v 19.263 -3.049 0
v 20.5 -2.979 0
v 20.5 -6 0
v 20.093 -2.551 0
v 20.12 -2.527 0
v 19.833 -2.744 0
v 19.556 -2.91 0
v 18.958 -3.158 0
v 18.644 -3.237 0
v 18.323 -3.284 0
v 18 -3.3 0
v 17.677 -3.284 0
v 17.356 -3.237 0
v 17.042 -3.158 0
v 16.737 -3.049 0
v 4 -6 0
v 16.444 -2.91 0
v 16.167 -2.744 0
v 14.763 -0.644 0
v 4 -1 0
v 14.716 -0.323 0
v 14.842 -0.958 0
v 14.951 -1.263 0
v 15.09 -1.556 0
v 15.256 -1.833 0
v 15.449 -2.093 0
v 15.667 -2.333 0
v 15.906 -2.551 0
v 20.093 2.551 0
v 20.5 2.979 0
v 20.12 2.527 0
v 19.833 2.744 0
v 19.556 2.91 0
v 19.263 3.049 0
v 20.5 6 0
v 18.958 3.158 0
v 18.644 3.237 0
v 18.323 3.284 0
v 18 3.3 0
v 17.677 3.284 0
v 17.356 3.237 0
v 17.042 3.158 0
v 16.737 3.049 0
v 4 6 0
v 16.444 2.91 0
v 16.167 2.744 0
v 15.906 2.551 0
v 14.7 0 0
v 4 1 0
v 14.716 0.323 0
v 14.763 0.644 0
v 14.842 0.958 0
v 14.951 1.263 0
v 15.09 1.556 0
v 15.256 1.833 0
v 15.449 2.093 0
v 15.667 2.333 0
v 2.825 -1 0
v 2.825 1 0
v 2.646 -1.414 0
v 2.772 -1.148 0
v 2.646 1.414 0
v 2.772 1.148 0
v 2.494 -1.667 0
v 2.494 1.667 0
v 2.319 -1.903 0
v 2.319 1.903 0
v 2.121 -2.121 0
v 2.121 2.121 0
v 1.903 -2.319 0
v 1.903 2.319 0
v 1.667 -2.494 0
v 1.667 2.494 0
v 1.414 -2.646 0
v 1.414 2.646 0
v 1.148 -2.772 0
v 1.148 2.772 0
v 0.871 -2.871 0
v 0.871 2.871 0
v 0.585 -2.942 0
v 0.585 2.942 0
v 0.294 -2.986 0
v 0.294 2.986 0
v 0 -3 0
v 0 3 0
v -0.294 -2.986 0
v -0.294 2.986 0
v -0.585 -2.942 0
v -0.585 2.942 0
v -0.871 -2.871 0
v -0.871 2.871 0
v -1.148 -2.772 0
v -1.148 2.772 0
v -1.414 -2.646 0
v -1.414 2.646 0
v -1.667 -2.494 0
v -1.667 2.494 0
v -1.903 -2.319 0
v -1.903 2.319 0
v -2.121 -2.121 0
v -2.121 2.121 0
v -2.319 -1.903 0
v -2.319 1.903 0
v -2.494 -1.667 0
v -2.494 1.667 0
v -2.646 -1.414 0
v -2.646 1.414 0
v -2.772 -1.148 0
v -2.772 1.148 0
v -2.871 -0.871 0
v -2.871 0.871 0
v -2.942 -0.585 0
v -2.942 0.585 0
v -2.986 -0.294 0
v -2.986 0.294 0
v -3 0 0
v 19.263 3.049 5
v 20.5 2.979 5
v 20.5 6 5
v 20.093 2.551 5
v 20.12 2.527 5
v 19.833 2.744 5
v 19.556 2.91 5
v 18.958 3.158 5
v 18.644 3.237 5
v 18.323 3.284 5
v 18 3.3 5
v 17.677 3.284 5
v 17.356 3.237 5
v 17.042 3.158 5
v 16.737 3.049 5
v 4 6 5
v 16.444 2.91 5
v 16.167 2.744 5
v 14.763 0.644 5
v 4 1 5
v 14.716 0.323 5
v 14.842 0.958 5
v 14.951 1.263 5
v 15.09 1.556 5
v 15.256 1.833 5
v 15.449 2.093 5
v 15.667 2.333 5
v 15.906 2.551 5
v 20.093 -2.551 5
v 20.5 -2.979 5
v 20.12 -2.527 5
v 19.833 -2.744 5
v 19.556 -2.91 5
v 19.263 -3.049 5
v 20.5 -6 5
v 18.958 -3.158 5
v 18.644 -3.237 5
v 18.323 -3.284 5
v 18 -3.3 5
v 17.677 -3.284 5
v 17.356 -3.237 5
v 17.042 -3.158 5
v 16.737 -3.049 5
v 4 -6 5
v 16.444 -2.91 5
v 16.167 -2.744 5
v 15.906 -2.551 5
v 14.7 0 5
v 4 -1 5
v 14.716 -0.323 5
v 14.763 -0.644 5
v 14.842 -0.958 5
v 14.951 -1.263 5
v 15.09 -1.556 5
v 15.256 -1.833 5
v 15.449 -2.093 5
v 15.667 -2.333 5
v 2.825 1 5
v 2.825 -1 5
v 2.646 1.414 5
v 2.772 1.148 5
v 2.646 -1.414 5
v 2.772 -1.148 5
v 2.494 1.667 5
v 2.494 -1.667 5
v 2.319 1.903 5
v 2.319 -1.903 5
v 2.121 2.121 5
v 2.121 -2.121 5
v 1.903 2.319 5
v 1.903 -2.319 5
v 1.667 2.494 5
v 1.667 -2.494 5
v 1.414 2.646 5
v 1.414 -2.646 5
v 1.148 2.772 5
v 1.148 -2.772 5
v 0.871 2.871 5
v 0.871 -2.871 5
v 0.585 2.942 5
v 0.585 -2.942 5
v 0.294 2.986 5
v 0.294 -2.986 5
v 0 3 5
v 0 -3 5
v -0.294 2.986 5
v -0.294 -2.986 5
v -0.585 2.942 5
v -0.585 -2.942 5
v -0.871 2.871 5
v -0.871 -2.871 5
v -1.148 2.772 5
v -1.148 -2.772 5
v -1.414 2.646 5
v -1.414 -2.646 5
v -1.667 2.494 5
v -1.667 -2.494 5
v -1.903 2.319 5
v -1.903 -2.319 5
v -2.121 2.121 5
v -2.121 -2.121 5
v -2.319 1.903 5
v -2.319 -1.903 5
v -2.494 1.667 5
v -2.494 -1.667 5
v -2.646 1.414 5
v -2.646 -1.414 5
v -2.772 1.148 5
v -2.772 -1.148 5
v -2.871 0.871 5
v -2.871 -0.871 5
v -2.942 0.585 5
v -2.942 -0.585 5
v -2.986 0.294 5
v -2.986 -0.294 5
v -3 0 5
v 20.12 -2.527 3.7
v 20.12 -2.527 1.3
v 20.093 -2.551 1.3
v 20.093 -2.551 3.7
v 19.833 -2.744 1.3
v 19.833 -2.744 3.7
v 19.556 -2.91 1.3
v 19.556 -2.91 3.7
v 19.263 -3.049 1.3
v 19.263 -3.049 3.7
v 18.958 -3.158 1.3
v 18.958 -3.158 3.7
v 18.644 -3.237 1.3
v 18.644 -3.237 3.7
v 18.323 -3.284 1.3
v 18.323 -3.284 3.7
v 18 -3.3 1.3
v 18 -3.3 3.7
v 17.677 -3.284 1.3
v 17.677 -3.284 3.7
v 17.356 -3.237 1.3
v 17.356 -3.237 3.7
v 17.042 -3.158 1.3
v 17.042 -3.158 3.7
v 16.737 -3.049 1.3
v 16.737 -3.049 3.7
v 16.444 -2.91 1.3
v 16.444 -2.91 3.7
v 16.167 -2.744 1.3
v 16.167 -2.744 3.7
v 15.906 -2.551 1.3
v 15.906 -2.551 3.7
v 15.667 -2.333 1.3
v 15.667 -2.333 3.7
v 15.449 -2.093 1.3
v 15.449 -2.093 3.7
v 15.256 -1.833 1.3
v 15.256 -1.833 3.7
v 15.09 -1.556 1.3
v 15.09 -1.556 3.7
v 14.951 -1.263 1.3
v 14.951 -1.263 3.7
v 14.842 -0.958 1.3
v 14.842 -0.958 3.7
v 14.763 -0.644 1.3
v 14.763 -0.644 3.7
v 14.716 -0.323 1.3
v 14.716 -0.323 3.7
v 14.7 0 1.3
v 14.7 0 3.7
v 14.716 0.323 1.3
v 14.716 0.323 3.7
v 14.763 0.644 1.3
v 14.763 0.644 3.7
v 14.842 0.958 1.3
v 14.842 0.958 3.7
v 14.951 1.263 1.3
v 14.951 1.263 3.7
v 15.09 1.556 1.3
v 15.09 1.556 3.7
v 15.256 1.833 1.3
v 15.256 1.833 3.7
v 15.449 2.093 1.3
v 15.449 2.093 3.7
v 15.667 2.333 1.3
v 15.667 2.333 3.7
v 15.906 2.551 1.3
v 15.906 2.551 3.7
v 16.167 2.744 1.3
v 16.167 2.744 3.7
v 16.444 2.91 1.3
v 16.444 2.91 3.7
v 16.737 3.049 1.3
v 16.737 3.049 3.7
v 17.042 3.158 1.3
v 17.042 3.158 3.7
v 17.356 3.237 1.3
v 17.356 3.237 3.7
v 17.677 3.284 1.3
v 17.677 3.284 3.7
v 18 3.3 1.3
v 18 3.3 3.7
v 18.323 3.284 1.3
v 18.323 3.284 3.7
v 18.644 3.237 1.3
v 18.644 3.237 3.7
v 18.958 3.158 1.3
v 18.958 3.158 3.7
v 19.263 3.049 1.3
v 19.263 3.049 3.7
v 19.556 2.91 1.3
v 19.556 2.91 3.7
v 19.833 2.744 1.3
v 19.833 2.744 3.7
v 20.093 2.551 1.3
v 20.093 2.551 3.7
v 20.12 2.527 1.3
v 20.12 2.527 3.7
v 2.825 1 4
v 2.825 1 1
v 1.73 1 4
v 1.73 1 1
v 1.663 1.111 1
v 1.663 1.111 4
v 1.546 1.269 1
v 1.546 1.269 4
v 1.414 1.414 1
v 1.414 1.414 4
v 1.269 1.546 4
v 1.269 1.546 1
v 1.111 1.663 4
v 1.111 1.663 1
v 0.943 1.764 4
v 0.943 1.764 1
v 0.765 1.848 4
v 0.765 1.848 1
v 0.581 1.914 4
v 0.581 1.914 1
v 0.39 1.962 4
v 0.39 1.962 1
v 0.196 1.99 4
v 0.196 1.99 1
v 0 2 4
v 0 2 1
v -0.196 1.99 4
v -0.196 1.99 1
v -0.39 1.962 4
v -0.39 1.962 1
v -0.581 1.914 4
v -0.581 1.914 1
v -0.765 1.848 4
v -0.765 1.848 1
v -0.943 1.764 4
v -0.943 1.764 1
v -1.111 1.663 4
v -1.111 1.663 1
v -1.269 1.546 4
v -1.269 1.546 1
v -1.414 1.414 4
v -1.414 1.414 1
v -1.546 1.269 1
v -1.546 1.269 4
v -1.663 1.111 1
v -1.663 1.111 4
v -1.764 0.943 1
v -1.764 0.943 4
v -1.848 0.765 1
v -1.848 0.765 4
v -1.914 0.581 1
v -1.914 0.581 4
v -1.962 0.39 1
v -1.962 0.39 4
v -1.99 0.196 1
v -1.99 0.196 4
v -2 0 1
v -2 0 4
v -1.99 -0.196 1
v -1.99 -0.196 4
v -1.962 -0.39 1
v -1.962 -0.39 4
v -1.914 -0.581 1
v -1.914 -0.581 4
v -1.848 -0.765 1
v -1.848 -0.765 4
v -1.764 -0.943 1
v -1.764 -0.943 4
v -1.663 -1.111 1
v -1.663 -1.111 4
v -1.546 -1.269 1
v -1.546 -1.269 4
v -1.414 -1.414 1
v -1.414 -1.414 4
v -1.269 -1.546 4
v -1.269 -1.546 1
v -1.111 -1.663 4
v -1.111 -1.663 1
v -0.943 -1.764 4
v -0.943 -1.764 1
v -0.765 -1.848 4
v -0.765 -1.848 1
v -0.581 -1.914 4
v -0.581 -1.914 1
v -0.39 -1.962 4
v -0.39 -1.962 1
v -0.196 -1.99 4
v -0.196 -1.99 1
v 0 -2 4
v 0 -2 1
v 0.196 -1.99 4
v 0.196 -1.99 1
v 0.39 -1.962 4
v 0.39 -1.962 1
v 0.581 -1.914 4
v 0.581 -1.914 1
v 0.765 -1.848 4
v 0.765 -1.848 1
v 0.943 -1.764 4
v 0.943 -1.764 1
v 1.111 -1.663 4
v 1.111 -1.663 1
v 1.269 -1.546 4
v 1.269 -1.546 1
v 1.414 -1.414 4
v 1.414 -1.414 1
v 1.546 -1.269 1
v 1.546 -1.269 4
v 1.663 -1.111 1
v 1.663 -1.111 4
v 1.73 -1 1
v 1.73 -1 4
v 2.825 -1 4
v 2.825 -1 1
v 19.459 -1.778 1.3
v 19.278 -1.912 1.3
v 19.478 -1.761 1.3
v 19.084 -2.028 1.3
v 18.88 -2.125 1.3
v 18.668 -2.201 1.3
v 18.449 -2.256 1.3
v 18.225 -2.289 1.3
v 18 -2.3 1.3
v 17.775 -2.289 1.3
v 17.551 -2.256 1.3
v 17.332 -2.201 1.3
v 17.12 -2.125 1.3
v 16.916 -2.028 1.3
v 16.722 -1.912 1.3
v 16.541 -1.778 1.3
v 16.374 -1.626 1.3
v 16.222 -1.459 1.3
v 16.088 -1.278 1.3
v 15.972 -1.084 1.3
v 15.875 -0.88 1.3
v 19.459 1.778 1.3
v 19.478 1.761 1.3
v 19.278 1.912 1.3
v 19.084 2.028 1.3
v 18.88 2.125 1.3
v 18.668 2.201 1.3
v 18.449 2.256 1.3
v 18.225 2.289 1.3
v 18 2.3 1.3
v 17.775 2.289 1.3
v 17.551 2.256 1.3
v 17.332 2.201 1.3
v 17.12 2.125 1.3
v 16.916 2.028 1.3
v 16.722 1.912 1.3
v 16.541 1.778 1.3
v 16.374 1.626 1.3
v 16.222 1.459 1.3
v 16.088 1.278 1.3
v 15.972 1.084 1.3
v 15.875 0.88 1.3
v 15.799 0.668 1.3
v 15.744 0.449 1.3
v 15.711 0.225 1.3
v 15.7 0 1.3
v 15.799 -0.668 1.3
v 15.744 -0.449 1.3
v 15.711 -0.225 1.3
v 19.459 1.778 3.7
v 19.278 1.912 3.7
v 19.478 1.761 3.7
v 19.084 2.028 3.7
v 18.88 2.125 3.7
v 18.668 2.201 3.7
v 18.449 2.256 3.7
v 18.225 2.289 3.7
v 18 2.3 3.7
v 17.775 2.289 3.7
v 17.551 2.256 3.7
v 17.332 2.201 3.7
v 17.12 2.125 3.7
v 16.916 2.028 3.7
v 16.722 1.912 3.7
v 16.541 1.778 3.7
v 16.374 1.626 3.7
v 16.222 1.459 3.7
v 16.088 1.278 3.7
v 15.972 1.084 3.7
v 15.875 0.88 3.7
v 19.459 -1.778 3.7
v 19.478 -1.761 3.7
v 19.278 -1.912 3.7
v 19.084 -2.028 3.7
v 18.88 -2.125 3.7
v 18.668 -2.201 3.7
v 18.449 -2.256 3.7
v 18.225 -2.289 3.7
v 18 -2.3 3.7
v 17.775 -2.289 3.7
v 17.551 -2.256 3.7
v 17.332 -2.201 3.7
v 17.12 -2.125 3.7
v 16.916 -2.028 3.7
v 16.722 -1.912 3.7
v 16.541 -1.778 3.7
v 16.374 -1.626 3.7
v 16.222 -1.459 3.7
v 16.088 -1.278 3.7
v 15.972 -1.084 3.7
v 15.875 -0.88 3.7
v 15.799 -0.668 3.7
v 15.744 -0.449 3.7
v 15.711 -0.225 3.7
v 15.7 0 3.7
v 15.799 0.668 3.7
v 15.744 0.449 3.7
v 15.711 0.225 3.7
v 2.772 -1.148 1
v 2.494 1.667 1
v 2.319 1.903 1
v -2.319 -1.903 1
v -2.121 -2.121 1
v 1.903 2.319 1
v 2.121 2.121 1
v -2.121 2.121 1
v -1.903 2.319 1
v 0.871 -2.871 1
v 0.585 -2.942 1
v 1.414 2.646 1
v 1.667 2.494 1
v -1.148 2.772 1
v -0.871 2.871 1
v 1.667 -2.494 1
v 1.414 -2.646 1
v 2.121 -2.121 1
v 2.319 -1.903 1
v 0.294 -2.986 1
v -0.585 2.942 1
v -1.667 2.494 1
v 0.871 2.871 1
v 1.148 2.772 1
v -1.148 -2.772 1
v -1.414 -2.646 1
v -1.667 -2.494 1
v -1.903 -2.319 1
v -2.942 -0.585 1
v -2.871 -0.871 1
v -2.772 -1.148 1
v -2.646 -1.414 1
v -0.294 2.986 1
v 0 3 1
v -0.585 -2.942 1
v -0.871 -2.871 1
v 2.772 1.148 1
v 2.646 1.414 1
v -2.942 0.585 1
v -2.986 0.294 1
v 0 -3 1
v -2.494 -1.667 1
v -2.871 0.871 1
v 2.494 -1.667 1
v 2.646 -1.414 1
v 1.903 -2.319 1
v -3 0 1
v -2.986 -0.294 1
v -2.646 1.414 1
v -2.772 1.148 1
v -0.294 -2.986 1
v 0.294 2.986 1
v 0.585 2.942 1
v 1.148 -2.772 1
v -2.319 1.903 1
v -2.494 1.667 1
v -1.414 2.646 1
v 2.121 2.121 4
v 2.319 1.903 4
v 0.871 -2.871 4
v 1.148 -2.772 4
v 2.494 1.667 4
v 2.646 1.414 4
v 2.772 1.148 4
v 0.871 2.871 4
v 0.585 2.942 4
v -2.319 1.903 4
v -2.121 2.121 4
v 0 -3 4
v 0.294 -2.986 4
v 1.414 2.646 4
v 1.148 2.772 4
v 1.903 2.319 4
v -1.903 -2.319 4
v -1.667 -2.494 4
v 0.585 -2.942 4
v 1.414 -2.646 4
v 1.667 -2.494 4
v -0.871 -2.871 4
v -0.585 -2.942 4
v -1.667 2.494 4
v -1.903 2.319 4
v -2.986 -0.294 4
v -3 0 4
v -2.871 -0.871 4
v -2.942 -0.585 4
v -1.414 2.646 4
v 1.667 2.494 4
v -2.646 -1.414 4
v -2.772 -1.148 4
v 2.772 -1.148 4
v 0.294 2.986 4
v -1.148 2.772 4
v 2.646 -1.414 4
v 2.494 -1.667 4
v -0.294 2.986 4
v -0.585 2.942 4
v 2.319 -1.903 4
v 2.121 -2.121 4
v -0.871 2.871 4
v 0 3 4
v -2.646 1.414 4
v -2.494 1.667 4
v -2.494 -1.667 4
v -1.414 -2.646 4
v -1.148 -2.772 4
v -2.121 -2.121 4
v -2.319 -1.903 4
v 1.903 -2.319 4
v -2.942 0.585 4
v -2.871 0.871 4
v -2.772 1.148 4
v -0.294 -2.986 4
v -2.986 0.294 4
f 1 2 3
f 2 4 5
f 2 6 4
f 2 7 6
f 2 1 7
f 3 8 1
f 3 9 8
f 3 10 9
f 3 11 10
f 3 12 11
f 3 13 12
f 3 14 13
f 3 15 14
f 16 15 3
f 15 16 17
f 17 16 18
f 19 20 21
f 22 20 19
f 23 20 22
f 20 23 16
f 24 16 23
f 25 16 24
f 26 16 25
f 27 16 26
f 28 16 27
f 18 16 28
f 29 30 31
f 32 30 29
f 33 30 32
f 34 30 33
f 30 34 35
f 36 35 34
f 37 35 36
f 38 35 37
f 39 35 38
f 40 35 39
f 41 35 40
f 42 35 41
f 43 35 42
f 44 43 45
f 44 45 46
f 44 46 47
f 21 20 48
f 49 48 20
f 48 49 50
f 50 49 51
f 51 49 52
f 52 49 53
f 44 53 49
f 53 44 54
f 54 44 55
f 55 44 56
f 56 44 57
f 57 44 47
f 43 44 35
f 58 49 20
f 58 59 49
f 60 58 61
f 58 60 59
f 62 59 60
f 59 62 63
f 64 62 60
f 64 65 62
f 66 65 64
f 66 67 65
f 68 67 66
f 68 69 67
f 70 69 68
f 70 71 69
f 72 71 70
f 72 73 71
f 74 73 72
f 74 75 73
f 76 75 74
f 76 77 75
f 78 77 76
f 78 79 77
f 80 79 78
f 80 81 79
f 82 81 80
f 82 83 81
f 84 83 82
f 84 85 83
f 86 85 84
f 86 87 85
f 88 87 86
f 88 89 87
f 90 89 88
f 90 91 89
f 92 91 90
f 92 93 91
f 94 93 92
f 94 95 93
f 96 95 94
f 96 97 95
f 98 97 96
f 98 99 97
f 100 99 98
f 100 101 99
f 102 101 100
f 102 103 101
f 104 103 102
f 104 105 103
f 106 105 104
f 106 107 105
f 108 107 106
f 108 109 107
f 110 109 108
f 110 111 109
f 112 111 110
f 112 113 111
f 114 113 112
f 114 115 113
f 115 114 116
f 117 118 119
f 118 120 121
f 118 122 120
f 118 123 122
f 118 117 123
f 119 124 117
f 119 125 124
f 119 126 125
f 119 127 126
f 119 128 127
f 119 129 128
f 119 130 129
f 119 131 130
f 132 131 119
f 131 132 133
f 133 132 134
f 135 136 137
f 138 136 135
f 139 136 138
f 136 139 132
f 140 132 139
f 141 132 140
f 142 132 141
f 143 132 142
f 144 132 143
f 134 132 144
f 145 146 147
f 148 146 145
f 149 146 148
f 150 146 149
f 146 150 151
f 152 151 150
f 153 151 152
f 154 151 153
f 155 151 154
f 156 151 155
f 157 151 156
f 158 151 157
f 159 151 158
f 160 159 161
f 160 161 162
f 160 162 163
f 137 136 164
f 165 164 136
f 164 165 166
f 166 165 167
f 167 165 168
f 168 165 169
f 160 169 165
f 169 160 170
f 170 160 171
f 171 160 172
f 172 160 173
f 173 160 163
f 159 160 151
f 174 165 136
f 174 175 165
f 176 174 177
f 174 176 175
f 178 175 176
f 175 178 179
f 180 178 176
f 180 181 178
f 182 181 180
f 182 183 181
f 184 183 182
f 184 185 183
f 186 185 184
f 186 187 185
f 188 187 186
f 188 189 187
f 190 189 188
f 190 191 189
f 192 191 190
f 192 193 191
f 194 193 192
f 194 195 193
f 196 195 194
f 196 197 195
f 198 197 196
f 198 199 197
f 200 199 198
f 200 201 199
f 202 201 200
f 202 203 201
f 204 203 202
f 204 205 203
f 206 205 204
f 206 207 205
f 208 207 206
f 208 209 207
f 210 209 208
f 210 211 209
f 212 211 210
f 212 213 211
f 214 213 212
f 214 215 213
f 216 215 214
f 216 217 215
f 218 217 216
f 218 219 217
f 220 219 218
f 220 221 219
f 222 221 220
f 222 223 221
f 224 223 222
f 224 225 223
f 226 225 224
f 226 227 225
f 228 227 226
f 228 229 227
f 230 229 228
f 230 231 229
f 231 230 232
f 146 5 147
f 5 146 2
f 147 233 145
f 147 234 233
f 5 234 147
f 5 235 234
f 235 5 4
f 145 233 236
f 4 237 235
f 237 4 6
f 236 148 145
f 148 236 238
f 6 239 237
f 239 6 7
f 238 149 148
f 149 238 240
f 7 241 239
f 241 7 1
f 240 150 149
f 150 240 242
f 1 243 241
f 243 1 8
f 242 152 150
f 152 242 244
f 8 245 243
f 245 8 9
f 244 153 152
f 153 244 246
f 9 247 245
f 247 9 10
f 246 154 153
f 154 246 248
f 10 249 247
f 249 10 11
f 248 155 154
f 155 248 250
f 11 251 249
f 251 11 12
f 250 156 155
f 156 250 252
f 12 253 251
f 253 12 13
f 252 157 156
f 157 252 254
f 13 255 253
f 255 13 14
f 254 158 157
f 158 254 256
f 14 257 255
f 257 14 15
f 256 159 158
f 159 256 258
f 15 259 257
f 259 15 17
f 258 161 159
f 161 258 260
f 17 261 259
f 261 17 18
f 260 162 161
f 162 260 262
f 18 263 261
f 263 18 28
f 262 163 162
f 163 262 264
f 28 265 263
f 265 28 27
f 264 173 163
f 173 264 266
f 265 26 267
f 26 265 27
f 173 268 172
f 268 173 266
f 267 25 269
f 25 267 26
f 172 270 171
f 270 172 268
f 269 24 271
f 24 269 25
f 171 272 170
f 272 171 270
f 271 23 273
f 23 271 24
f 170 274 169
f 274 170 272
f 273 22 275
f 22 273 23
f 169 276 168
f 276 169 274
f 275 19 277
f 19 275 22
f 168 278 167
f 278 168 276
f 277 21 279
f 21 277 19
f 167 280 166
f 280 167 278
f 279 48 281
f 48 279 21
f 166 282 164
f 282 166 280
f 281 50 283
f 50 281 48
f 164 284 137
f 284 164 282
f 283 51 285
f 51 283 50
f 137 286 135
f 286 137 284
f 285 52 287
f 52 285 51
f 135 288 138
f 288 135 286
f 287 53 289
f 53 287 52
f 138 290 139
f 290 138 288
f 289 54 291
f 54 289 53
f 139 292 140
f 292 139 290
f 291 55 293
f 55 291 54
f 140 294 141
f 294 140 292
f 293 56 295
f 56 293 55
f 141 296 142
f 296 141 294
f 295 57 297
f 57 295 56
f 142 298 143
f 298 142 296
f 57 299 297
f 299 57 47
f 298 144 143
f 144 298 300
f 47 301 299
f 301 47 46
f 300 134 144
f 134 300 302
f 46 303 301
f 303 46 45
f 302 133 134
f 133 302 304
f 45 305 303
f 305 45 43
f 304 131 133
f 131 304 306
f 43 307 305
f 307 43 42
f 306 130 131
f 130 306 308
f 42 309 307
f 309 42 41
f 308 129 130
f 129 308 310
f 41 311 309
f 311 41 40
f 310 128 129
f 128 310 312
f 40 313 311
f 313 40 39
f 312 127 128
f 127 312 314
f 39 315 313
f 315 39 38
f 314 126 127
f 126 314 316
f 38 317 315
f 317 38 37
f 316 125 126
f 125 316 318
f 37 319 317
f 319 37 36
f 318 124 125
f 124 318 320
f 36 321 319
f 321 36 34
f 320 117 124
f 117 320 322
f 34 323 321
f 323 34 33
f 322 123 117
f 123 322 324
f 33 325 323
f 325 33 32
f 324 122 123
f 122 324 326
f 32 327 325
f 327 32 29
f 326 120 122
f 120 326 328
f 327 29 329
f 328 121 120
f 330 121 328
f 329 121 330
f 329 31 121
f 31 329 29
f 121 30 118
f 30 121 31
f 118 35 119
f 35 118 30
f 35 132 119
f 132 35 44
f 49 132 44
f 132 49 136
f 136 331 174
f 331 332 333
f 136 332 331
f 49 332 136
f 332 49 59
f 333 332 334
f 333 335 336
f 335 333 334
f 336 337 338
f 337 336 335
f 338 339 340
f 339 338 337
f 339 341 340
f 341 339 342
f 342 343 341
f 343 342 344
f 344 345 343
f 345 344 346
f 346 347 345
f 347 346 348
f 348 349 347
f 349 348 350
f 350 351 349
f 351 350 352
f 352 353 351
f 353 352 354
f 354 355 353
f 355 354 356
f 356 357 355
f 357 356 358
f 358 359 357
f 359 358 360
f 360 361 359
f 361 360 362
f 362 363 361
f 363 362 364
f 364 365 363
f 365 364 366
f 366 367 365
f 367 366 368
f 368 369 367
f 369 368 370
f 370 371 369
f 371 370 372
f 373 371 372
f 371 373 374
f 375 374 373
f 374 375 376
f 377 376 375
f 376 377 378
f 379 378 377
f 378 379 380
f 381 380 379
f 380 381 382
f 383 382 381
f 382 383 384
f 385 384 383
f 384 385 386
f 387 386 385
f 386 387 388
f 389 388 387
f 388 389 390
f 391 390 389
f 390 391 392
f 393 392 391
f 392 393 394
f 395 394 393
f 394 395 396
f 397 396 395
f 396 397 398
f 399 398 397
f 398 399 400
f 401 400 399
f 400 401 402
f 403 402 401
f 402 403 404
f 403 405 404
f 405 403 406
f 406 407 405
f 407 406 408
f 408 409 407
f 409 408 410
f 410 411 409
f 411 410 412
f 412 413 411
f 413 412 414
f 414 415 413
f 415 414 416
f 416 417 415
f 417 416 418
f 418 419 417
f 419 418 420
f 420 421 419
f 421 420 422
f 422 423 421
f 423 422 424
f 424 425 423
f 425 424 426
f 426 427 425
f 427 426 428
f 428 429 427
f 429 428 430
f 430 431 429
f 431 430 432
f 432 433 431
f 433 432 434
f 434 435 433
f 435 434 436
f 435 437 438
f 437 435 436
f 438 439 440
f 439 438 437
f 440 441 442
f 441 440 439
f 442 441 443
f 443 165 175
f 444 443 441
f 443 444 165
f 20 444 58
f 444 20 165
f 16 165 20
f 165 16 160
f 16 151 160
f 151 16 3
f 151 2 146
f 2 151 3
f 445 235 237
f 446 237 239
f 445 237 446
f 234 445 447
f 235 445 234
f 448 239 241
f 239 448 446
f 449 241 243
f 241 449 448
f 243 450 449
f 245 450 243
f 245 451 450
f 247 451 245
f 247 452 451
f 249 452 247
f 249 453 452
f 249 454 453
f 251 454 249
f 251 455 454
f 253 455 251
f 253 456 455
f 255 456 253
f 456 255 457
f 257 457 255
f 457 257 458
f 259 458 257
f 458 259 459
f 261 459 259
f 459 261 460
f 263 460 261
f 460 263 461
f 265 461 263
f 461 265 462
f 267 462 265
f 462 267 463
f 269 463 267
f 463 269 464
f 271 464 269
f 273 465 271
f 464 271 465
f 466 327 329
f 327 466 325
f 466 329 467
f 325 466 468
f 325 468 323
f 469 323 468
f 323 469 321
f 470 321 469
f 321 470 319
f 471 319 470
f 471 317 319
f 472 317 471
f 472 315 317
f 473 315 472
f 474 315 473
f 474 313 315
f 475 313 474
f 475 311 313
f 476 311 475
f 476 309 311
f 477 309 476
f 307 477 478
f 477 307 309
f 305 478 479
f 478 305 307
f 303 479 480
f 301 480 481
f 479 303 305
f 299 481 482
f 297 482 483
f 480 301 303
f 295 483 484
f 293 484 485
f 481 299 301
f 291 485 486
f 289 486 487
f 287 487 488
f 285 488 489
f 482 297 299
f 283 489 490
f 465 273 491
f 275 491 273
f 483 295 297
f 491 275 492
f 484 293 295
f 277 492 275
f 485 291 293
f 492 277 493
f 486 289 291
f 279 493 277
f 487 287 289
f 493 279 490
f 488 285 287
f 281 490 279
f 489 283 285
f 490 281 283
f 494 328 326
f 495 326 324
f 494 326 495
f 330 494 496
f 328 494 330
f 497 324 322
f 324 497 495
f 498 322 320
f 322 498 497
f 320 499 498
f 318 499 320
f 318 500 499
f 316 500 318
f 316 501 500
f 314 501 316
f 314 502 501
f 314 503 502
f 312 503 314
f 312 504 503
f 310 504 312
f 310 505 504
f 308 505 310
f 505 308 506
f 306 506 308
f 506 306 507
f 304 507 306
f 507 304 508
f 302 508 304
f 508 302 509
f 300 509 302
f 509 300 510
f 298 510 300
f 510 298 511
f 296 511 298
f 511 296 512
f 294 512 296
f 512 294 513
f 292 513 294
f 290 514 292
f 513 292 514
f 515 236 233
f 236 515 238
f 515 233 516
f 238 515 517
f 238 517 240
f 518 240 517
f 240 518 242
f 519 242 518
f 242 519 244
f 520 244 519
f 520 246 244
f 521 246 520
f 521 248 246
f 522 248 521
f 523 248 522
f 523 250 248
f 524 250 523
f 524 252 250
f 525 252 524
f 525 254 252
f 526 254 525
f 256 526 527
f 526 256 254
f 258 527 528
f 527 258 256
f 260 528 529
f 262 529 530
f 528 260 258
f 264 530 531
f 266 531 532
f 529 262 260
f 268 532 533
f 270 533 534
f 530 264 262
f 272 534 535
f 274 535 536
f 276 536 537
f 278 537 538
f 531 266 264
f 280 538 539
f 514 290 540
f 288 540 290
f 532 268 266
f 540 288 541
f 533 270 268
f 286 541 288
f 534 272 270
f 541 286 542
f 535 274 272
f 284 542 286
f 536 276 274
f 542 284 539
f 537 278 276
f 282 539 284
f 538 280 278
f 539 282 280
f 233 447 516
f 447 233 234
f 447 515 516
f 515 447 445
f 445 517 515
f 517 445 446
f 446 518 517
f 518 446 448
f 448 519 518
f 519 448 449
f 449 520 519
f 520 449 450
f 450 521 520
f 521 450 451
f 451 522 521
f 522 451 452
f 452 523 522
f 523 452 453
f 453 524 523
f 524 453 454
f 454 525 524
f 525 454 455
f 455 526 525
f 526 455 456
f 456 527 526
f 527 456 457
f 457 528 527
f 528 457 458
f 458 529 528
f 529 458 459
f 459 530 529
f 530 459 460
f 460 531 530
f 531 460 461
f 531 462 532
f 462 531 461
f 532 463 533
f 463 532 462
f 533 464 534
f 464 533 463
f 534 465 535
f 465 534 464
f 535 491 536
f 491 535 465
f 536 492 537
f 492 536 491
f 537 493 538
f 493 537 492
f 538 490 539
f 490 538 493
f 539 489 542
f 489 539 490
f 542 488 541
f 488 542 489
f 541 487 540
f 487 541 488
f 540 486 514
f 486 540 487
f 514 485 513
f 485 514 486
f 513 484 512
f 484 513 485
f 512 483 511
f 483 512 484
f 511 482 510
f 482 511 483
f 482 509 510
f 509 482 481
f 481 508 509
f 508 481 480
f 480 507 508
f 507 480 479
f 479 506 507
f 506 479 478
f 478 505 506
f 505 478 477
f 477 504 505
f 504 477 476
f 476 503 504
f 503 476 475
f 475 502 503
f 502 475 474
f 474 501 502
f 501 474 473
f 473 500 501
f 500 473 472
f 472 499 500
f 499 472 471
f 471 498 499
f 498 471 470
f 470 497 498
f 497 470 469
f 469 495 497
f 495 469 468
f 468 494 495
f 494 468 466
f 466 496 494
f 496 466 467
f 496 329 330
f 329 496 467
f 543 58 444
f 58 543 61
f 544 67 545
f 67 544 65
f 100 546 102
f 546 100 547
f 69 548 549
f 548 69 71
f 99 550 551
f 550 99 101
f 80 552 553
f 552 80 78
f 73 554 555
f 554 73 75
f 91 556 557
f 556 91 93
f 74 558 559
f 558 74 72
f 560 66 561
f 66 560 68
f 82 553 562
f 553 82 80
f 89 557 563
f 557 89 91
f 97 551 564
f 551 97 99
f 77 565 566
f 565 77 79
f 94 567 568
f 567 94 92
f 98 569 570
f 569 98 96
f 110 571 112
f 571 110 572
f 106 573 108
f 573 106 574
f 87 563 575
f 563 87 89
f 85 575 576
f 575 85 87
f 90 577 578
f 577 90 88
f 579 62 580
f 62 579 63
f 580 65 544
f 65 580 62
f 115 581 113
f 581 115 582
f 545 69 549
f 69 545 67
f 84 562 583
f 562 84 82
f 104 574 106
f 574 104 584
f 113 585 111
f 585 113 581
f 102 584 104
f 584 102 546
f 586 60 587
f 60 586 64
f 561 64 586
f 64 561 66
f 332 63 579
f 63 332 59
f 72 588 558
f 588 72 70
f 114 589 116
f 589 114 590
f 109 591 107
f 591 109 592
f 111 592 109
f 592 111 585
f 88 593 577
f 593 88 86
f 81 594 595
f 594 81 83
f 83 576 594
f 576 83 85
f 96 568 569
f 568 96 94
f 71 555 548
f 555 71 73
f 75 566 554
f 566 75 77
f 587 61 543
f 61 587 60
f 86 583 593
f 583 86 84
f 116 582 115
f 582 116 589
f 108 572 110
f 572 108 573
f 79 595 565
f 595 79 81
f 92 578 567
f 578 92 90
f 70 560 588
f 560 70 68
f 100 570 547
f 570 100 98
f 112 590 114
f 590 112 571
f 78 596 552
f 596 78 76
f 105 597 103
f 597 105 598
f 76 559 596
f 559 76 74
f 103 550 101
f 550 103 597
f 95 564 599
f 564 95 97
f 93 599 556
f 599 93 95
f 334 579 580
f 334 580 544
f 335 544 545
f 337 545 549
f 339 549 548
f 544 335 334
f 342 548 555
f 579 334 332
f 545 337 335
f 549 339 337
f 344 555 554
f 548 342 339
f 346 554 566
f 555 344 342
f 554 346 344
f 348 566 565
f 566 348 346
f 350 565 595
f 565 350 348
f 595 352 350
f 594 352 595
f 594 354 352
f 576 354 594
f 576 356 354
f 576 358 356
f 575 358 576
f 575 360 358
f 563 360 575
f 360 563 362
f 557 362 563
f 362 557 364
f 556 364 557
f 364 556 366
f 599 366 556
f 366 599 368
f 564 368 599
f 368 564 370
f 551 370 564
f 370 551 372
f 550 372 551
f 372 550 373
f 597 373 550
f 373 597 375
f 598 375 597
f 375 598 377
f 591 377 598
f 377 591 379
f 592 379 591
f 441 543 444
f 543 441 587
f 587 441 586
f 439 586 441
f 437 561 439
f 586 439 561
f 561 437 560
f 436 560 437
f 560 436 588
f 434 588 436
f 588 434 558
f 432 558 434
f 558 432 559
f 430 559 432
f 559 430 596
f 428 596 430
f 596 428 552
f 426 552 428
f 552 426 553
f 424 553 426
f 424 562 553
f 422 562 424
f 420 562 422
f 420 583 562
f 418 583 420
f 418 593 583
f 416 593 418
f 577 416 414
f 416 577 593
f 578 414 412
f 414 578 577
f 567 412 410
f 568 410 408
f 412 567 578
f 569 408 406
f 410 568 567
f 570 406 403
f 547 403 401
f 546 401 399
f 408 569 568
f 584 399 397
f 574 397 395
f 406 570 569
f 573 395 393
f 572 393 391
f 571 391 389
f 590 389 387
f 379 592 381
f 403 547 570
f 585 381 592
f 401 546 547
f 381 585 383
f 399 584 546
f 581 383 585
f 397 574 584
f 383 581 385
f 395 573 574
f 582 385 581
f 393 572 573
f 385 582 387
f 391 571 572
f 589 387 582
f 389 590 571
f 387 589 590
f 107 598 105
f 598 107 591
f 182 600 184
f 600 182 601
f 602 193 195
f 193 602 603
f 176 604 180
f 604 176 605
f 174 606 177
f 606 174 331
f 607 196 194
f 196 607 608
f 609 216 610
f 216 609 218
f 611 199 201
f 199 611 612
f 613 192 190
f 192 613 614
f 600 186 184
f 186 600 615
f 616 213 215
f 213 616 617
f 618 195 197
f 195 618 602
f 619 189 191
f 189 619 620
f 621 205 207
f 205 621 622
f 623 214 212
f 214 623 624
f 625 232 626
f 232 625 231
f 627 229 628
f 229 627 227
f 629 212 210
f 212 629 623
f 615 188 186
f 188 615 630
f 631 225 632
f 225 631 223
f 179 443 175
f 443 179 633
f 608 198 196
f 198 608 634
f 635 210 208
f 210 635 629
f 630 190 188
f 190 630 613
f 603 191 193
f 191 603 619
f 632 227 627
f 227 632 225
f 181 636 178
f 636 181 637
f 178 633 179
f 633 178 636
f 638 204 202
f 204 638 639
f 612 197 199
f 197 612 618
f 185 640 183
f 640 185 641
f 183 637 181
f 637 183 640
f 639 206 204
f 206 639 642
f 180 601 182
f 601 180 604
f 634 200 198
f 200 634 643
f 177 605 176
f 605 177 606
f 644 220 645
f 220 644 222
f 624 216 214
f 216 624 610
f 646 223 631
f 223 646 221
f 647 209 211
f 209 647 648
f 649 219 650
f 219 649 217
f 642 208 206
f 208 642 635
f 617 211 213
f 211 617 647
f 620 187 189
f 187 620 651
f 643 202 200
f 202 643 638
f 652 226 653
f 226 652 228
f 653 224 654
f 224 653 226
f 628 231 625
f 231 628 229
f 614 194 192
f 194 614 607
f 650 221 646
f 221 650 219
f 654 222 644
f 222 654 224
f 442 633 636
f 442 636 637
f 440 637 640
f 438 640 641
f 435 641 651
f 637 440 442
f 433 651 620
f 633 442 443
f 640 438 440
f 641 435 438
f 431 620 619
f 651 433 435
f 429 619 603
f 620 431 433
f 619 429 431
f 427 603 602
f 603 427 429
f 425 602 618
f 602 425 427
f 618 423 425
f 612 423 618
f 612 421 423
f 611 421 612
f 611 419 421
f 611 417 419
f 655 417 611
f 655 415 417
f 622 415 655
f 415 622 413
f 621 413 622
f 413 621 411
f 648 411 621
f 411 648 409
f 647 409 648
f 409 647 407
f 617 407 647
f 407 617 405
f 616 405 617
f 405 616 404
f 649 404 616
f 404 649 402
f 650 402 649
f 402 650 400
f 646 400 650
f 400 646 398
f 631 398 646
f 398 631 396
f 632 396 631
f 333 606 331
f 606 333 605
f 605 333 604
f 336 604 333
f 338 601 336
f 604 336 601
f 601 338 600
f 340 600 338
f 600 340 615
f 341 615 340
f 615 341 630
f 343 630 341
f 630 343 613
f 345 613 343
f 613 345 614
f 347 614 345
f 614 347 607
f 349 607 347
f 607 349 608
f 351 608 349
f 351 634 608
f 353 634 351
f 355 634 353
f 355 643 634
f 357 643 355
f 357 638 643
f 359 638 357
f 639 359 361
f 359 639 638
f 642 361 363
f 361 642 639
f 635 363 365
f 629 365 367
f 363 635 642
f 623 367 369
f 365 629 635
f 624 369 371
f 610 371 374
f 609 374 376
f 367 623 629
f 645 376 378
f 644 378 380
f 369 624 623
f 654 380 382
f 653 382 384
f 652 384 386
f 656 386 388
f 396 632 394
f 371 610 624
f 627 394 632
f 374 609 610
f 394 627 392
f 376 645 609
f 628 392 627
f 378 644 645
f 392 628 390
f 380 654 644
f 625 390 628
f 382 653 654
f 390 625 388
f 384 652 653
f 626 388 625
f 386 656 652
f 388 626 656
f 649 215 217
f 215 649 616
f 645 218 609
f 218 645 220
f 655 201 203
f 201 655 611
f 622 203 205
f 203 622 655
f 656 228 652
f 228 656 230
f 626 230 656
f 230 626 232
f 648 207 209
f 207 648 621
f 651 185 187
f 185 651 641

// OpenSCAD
part = "link"; // [link, assembly]
cadverify_only = "";
module instance(name, part, unit = 1) {
    echo(cadverify_instance = [name, part, unit]);
    if (cadverify_only == "" || cadverify_only == name) children();
}

// Parameters (mm)
pitch = 18;          // pin-to-bore distance
link_w = 12;         // width (Y)
link_t = 5;          // thickness (Z)
pin_d = 4;           // pin shaft diameter
bore_d = 4.6;        // bore diameter (0.3 radial clearance)
cap_d = 6;           // cap diameter
cap_h = 1;           // cap thickness
gap_z = 0.3;         // vertical clearance cap<->knuckle
kn_h = 2.4;          // knuckle height = 5-2*1-2*0.3
kn_out_d = 7.6;      // knuckle outer diameter (1.5 wall)
cap_cav_d = 6.6;     // cap cavity diameter (0.3 radial clearance)
neck_w = 2;          // neck width
slot_half = 50;      // slot half-angle (deg), allows +-30 deg swing
yoke_east = 20.5;    // full-height yoke east extent (local X)
$fn = 64;

module link_geom() {
    bore_x = pitch;
    cap_r = cap_d/2;
    cav_r = cap_cav_d/2;
    pin_r = pin_d/2;
    bore_r = bore_d/2;
    kn_out_r = kn_out_d/2;
    // far points for slot wedge (full height + middle)
    // wedge from bore center to the east, half-angle slot_half
    wedge_far = 30;
    dy_far = wedge_far * tan(slot_half);
    // ---- full height (0..5): yoke + neck + pin shaft ----
    linear_extrude(height = link_t, convexity = 8) {
        difference() {
            union() {
                // pin shaft disc
                translate([0,0]) circle(r = pin_r);
                // neck rect X[0,5] Y[-1,1]
                translate([0,-neck_w/2]) square([5, neck_w]);
                // yoke base rect X[4,yoke_east] Y[-6,6]
                translate([4,-link_w/2]) square([yoke_east-4, link_w]);
            }
            // cap cavity (for next link caps)
            translate([bore_x,0]) circle(r = cav_r);
            // slot wedge for next-link neck swing (full height)
            polygon(points = [[bore_x,0],[bore_x+wedge_far, dy_far],[bore_x+wedge_far, -dy_far]]);
        }
    }
    // ---- middle knuckle ring (1.3..3.7) ----
    kn_bot = cap_h + gap_z; // 1.3
    translate([0,0,kn_bot])
    linear_extrude(height = kn_h, convexity = 8) {
        difference() {
            translate([bore_x,0]) circle(r = kn_out_r);
            translate([bore_x,0]) circle(r = bore_r);
            polygon(points = [[bore_x,0],[bore_x+wedge_far, dy_far],[bore_x+wedge_far, -dy_far]]);
        }
    }
    // ---- caps ----
    translate([0,0,0]) cylinder(h = cap_h, r = cap_r);
    translate([0,0,link_t-cap_h]) cylinder(h = cap_h, r = cap_r);
}

if (part == "assembly") {
    instance("link1", "link", 1) translate([0,0,0]) link_geom();
    instance("link2", "link", 1) translate([18,0,0]) link_geom();
    instance("link3", "link", 1) translate([36,0,0]) link_geom();
    echo(cadverify_spec = [
        ["bounds", [[-3, -6, 0], [56.5, 6, 5]]],
        ["support_faces", [["bed", "-z", 200]]],
        ["motions", [
            ["bend", ["link3"], "rotate", [36, 0, 0], [0, 0, 1], [-30, 30]]
        ]],
        ["assembly_order", [
            [["link1", "link2", "link3"], [0, 0, 0]]
        ]],
        ["print_in_place", 0.3],
        ["overhangs_allowed", [
            ["pin cap link1", [[-3, -3, 3.8], [3, 3, 4.2]]],
            ["knuckle joint1", [[14.5, -3.5, 1.0], [21, 3.5, 1.5]]],
            ["pin cap link2", [[15, -3, 3.8], [21, 3, 4.2]]],
            ["knuckle joint2", [[32.5, -3.5, 1.0], [39, 3.5, 1.5]]],
            ["pin cap link3", [[33, -3, 3.8], [39, 3, 4.2]]],
            ["knuckle end", [[50.5, -3.5, 1.0], [57, 3.5, 1.5]]]
        ]],
        ["held", ["link1", "link2", "link3"]]
    ]);
} else {
    link_geom();
    echo(cadverify_spec = [
        ["bounds", [[-3, -6, 0], [20.5, 6, 5]]],
        ["bodies", 1],
        ["through_holes", 0],
        ["support_faces", [["bed", "-z", 100]]],
        ["overhangs_allowed", [
            ["pin cap", [[-3, -3, 3.8], [3, 3, 4.2]]],
            ["knuckle ceiling", [[14.5, -3.5, 1.0], [21, 3.5, 1.5]]]
        ]],
        ["copies", 3],
        ["details", [
            ["body", "material", [[4, -6, 0], [14, 6, 5]], 0.85],
            ["neck", "material", [[0, -1, 0], [5, 1, 5]], 0.8],
            ["knuckle", "material", [[14.2, -3.8, 1.3], [21.8, 3.8, 3.7]], 0.25],
            ["slot", "void", [[19, -1, 0], [21, 1, 5]], 0.8],
            ["cap_cavity", "void", [[14.7, -3.3, 0], [21.3, 3.3, 1]], 0.5],
            ["wall", "thickness", [18, 7, 0.5], [0, -1, 0], 2.7],
            ["floor", "thickness", [9, 0, -1], [0, 0, 1], 5]
        ]]
    ]);
}
